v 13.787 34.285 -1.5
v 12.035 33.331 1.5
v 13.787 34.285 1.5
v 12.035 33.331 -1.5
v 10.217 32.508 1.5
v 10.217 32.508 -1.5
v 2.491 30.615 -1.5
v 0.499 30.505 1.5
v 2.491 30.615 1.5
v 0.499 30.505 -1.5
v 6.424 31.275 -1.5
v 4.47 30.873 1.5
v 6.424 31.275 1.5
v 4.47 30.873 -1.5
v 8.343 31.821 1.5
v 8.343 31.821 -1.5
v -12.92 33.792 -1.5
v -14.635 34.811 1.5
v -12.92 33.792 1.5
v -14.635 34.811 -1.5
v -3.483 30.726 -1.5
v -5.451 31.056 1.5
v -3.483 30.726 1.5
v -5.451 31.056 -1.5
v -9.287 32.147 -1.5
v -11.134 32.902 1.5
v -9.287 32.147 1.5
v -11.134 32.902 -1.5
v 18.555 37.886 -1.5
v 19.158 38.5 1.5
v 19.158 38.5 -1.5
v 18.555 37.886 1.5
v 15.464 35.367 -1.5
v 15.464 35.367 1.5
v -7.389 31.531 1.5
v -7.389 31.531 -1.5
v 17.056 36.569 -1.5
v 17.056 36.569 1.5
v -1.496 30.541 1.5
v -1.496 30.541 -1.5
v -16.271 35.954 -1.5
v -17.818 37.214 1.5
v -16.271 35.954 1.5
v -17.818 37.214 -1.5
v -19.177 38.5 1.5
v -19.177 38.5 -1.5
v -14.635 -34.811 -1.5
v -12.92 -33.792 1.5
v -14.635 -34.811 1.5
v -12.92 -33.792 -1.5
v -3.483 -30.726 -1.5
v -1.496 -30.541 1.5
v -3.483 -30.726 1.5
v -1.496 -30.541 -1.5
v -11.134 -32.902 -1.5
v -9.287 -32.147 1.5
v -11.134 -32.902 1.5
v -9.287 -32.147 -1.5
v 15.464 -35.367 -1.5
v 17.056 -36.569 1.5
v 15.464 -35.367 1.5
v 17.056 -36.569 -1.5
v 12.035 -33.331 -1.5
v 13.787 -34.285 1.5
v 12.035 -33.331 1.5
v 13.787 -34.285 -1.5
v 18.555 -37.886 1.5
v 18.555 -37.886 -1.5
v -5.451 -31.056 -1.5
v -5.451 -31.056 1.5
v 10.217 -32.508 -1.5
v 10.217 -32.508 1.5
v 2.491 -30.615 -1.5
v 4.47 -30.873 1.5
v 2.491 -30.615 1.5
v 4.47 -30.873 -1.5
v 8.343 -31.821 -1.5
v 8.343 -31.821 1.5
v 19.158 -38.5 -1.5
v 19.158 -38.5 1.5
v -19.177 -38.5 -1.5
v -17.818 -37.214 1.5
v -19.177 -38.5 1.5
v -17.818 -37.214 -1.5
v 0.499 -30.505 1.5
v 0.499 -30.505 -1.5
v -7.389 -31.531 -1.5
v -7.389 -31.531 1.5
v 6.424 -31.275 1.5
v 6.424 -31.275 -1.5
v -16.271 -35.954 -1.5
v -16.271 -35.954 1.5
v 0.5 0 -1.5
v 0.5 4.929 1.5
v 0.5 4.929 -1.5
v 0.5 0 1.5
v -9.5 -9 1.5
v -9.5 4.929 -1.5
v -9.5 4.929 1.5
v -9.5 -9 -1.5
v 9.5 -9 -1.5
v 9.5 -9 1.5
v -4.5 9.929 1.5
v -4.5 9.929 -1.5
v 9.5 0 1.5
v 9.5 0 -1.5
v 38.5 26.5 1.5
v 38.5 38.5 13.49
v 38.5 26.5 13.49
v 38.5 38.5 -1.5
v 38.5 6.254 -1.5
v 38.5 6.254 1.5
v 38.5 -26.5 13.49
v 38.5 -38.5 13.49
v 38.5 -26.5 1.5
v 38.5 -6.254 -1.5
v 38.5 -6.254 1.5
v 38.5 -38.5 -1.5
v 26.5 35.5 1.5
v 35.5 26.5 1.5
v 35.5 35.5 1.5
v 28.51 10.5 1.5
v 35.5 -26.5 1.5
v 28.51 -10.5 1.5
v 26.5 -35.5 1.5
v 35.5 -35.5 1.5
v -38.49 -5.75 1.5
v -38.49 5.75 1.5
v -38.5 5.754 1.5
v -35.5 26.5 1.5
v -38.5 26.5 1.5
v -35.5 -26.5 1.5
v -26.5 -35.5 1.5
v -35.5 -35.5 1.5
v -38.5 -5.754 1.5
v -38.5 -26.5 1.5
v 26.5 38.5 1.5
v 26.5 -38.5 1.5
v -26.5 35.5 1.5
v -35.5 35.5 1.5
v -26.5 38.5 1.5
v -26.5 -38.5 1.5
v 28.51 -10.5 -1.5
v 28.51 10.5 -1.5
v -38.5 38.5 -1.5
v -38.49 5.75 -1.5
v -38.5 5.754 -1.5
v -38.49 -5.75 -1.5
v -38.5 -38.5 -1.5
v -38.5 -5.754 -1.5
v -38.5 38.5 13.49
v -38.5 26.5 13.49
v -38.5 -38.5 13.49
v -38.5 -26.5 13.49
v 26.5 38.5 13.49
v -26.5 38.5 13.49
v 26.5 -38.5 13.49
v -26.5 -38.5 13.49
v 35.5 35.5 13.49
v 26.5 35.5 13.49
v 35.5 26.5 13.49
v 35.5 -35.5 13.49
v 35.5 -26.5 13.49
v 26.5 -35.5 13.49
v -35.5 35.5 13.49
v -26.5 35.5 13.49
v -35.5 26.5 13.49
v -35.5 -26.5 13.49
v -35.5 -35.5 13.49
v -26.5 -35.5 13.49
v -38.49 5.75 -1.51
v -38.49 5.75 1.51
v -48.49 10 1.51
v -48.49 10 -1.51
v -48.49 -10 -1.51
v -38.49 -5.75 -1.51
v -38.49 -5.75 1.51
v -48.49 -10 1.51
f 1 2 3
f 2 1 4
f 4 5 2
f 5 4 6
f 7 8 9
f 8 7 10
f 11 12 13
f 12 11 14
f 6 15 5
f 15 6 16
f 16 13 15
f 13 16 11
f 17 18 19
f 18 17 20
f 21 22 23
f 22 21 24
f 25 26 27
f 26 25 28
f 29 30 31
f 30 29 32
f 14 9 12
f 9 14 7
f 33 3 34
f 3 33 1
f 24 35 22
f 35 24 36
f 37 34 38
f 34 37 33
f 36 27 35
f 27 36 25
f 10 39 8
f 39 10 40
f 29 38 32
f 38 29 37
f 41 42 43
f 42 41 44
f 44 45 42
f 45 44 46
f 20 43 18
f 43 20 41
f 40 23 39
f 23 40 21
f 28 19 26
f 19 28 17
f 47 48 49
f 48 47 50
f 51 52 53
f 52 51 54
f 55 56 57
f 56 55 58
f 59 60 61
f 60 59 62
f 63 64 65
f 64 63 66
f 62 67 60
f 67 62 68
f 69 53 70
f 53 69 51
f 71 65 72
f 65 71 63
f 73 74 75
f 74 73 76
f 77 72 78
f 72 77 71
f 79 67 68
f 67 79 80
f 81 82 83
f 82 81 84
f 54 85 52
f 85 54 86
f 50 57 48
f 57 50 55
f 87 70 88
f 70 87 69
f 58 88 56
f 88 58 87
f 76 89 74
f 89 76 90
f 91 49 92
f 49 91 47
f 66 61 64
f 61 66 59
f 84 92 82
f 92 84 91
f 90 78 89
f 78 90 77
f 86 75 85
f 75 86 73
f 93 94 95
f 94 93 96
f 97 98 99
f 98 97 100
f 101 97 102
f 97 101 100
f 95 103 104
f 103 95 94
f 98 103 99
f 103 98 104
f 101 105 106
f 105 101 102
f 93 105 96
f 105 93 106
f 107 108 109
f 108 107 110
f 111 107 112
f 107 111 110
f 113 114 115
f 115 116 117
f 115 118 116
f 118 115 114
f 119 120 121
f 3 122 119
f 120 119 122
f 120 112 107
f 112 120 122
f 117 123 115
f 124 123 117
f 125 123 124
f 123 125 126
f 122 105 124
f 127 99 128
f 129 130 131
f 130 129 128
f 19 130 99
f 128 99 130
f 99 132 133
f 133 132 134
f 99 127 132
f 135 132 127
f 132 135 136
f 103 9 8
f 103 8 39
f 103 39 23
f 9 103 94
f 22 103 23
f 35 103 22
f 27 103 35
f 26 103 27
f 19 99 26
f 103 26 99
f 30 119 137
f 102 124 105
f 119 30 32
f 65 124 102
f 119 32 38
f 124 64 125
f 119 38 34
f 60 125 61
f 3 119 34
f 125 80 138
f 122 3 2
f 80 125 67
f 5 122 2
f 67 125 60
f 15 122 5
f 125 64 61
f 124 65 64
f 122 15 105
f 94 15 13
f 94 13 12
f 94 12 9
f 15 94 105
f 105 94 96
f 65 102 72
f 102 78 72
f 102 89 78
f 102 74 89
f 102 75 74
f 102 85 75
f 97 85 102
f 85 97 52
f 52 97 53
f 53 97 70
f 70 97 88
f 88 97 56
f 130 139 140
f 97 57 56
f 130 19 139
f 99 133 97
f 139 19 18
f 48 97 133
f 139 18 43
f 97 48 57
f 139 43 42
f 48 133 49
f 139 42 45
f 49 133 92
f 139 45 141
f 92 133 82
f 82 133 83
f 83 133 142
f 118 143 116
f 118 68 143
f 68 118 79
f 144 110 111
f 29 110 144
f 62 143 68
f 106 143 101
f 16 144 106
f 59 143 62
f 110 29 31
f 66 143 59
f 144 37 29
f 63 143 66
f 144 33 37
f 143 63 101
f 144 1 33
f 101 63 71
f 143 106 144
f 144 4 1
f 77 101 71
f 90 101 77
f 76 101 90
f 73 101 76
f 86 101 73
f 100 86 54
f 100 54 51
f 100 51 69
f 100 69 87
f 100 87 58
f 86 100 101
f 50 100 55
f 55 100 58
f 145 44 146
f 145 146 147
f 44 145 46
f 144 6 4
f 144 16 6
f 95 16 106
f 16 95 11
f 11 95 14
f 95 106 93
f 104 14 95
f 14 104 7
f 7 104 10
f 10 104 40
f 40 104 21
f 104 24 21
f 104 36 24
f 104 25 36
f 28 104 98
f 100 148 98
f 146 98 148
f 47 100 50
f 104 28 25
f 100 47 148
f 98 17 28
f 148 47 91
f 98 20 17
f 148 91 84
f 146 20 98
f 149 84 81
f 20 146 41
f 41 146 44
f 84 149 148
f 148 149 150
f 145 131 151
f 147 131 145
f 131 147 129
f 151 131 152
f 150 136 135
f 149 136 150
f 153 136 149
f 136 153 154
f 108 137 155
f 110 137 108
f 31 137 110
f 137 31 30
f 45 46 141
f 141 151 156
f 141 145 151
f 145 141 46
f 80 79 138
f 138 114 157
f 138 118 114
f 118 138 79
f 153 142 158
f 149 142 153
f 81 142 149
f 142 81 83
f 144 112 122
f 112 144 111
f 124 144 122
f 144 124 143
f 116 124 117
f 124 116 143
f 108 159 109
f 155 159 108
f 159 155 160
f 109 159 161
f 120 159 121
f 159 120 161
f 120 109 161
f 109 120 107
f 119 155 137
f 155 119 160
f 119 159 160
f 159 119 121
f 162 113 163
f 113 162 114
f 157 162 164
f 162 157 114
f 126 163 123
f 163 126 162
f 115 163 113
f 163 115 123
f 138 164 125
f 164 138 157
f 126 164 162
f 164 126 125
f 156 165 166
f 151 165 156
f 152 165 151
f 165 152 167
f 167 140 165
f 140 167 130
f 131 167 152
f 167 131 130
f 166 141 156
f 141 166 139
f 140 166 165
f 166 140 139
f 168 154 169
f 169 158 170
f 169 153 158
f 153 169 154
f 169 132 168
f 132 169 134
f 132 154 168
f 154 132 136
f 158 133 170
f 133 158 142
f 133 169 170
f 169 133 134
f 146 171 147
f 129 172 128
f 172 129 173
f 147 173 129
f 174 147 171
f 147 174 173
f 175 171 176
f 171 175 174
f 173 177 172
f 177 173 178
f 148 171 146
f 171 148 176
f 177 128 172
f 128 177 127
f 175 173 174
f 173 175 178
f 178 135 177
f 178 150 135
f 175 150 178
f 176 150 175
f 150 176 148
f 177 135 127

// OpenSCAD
/* Settlers or Rivals of Catan game card holder
 *
 * Wherever 0.01 appears below, it's a small adjustment amount to make sure pieces overlap.
 */

// Card size measured in mm
card_width = 69; // Use 69 for Rivals of Catan, 54 for Settlers
card_height = 69; // Use 69 for Rivals of Catan, 80 for Settlers
card_space = 2;

// Parameters for walls that hold the cards
wall_thickness = 3;
wall_height = 12;
wall_length = 12;

// Parameters for the base plate
plate_depth = 3;
plate_width = card_width + card_space + wall_thickness * 2;
plate_height = card_height + card_space + wall_thickness * 2;

// Connecting piece parameters.
conn_width = 10;
conn_height_small = 11.5;
conn_height_large = 20;

// Object that represents the puzzle piece connector
// The female connector is made 1mm taller, but you may need to adjust this value
// slightly if the parts don't fit together.
module Connector(male) {
  height_small = conn_height_small + (male ? 0 : 1);
  height_large = conn_height_large + (male ? 0 : 1);
  linear_extrude(height=plate_depth + 0.02, center=true, convexity=10, twist=0) {
    translate([0, 0, -plate_depth / 2 - 0.01])
      polygon([[0, height_small / 2],
               [-conn_width, height_large / 2],
               [-conn_width, -height_large / 2],
               [0, -height_small / 2]]);
  }
}

union() {
  difference() {
    // Base plate
    cube([plate_width, plate_height, plate_depth], center = true);

    // Round cuts to make grabbing cards easier
    for (dir = [1, -1]) {
      translate([0, dir * (card_height / 2 + 23), 0])
        cylinder(h=10, r=27, center=true, $fa=2);
    }

    // Logo
    union() {
      translate([0, -4.5, 0])
        cube(size = [19, 9, 10], center = true);
      difference() {
        translate([-4.5, 0.5 ,0])
          cube(size = [10, 19, 10], center = true);
        translate([0.5, 12 ,0])
          rotate([0, 0, 45])
          cube(size = [10, 12, 11], center = true);
        translate([-9.5, 12, 0])
          rotate([0, 0, 45])
          cube(size = [12, 10, 11], center = true);
      }
    }

    // Female connector
    translate([plate_width / 2 + 0.01, 0, 0])
      Connector(false);
  }

  // Male connector
  translate([-plate_width / 2 + 0.01, 0, 0])
    Connector(true);

  //Cards for reference
  card_depth = 9;
  translate([0, 0, (plate_depth + card_depth) / 2])
    %cube(size = [card_width, card_height, card_depth], center=true);

  // Four pairs of corner walls
  wall_offset = wall_thickness - wall_length;
  for (x = [0:1], y = [0:1]) {
    mirror([x, 0, 0]) {
      mirror([0, y, 0]) {
        translate([(card_width + card_space) / 2,
                   (card_height + card_space) / 2 + wall_offset,
                   plate_depth / 2 - 0.01])
          cube([wall_thickness, wall_length, wall_height], center=false);

        translate([(card_width + card_space ) / 2 + wall_offset,
                   (card_height + card_space) / 2,
                   plate_depth / 2 - 0.01])
          cube([wall_length, wall_thickness, wall_height], center=false);
      }
    }
  }
}
